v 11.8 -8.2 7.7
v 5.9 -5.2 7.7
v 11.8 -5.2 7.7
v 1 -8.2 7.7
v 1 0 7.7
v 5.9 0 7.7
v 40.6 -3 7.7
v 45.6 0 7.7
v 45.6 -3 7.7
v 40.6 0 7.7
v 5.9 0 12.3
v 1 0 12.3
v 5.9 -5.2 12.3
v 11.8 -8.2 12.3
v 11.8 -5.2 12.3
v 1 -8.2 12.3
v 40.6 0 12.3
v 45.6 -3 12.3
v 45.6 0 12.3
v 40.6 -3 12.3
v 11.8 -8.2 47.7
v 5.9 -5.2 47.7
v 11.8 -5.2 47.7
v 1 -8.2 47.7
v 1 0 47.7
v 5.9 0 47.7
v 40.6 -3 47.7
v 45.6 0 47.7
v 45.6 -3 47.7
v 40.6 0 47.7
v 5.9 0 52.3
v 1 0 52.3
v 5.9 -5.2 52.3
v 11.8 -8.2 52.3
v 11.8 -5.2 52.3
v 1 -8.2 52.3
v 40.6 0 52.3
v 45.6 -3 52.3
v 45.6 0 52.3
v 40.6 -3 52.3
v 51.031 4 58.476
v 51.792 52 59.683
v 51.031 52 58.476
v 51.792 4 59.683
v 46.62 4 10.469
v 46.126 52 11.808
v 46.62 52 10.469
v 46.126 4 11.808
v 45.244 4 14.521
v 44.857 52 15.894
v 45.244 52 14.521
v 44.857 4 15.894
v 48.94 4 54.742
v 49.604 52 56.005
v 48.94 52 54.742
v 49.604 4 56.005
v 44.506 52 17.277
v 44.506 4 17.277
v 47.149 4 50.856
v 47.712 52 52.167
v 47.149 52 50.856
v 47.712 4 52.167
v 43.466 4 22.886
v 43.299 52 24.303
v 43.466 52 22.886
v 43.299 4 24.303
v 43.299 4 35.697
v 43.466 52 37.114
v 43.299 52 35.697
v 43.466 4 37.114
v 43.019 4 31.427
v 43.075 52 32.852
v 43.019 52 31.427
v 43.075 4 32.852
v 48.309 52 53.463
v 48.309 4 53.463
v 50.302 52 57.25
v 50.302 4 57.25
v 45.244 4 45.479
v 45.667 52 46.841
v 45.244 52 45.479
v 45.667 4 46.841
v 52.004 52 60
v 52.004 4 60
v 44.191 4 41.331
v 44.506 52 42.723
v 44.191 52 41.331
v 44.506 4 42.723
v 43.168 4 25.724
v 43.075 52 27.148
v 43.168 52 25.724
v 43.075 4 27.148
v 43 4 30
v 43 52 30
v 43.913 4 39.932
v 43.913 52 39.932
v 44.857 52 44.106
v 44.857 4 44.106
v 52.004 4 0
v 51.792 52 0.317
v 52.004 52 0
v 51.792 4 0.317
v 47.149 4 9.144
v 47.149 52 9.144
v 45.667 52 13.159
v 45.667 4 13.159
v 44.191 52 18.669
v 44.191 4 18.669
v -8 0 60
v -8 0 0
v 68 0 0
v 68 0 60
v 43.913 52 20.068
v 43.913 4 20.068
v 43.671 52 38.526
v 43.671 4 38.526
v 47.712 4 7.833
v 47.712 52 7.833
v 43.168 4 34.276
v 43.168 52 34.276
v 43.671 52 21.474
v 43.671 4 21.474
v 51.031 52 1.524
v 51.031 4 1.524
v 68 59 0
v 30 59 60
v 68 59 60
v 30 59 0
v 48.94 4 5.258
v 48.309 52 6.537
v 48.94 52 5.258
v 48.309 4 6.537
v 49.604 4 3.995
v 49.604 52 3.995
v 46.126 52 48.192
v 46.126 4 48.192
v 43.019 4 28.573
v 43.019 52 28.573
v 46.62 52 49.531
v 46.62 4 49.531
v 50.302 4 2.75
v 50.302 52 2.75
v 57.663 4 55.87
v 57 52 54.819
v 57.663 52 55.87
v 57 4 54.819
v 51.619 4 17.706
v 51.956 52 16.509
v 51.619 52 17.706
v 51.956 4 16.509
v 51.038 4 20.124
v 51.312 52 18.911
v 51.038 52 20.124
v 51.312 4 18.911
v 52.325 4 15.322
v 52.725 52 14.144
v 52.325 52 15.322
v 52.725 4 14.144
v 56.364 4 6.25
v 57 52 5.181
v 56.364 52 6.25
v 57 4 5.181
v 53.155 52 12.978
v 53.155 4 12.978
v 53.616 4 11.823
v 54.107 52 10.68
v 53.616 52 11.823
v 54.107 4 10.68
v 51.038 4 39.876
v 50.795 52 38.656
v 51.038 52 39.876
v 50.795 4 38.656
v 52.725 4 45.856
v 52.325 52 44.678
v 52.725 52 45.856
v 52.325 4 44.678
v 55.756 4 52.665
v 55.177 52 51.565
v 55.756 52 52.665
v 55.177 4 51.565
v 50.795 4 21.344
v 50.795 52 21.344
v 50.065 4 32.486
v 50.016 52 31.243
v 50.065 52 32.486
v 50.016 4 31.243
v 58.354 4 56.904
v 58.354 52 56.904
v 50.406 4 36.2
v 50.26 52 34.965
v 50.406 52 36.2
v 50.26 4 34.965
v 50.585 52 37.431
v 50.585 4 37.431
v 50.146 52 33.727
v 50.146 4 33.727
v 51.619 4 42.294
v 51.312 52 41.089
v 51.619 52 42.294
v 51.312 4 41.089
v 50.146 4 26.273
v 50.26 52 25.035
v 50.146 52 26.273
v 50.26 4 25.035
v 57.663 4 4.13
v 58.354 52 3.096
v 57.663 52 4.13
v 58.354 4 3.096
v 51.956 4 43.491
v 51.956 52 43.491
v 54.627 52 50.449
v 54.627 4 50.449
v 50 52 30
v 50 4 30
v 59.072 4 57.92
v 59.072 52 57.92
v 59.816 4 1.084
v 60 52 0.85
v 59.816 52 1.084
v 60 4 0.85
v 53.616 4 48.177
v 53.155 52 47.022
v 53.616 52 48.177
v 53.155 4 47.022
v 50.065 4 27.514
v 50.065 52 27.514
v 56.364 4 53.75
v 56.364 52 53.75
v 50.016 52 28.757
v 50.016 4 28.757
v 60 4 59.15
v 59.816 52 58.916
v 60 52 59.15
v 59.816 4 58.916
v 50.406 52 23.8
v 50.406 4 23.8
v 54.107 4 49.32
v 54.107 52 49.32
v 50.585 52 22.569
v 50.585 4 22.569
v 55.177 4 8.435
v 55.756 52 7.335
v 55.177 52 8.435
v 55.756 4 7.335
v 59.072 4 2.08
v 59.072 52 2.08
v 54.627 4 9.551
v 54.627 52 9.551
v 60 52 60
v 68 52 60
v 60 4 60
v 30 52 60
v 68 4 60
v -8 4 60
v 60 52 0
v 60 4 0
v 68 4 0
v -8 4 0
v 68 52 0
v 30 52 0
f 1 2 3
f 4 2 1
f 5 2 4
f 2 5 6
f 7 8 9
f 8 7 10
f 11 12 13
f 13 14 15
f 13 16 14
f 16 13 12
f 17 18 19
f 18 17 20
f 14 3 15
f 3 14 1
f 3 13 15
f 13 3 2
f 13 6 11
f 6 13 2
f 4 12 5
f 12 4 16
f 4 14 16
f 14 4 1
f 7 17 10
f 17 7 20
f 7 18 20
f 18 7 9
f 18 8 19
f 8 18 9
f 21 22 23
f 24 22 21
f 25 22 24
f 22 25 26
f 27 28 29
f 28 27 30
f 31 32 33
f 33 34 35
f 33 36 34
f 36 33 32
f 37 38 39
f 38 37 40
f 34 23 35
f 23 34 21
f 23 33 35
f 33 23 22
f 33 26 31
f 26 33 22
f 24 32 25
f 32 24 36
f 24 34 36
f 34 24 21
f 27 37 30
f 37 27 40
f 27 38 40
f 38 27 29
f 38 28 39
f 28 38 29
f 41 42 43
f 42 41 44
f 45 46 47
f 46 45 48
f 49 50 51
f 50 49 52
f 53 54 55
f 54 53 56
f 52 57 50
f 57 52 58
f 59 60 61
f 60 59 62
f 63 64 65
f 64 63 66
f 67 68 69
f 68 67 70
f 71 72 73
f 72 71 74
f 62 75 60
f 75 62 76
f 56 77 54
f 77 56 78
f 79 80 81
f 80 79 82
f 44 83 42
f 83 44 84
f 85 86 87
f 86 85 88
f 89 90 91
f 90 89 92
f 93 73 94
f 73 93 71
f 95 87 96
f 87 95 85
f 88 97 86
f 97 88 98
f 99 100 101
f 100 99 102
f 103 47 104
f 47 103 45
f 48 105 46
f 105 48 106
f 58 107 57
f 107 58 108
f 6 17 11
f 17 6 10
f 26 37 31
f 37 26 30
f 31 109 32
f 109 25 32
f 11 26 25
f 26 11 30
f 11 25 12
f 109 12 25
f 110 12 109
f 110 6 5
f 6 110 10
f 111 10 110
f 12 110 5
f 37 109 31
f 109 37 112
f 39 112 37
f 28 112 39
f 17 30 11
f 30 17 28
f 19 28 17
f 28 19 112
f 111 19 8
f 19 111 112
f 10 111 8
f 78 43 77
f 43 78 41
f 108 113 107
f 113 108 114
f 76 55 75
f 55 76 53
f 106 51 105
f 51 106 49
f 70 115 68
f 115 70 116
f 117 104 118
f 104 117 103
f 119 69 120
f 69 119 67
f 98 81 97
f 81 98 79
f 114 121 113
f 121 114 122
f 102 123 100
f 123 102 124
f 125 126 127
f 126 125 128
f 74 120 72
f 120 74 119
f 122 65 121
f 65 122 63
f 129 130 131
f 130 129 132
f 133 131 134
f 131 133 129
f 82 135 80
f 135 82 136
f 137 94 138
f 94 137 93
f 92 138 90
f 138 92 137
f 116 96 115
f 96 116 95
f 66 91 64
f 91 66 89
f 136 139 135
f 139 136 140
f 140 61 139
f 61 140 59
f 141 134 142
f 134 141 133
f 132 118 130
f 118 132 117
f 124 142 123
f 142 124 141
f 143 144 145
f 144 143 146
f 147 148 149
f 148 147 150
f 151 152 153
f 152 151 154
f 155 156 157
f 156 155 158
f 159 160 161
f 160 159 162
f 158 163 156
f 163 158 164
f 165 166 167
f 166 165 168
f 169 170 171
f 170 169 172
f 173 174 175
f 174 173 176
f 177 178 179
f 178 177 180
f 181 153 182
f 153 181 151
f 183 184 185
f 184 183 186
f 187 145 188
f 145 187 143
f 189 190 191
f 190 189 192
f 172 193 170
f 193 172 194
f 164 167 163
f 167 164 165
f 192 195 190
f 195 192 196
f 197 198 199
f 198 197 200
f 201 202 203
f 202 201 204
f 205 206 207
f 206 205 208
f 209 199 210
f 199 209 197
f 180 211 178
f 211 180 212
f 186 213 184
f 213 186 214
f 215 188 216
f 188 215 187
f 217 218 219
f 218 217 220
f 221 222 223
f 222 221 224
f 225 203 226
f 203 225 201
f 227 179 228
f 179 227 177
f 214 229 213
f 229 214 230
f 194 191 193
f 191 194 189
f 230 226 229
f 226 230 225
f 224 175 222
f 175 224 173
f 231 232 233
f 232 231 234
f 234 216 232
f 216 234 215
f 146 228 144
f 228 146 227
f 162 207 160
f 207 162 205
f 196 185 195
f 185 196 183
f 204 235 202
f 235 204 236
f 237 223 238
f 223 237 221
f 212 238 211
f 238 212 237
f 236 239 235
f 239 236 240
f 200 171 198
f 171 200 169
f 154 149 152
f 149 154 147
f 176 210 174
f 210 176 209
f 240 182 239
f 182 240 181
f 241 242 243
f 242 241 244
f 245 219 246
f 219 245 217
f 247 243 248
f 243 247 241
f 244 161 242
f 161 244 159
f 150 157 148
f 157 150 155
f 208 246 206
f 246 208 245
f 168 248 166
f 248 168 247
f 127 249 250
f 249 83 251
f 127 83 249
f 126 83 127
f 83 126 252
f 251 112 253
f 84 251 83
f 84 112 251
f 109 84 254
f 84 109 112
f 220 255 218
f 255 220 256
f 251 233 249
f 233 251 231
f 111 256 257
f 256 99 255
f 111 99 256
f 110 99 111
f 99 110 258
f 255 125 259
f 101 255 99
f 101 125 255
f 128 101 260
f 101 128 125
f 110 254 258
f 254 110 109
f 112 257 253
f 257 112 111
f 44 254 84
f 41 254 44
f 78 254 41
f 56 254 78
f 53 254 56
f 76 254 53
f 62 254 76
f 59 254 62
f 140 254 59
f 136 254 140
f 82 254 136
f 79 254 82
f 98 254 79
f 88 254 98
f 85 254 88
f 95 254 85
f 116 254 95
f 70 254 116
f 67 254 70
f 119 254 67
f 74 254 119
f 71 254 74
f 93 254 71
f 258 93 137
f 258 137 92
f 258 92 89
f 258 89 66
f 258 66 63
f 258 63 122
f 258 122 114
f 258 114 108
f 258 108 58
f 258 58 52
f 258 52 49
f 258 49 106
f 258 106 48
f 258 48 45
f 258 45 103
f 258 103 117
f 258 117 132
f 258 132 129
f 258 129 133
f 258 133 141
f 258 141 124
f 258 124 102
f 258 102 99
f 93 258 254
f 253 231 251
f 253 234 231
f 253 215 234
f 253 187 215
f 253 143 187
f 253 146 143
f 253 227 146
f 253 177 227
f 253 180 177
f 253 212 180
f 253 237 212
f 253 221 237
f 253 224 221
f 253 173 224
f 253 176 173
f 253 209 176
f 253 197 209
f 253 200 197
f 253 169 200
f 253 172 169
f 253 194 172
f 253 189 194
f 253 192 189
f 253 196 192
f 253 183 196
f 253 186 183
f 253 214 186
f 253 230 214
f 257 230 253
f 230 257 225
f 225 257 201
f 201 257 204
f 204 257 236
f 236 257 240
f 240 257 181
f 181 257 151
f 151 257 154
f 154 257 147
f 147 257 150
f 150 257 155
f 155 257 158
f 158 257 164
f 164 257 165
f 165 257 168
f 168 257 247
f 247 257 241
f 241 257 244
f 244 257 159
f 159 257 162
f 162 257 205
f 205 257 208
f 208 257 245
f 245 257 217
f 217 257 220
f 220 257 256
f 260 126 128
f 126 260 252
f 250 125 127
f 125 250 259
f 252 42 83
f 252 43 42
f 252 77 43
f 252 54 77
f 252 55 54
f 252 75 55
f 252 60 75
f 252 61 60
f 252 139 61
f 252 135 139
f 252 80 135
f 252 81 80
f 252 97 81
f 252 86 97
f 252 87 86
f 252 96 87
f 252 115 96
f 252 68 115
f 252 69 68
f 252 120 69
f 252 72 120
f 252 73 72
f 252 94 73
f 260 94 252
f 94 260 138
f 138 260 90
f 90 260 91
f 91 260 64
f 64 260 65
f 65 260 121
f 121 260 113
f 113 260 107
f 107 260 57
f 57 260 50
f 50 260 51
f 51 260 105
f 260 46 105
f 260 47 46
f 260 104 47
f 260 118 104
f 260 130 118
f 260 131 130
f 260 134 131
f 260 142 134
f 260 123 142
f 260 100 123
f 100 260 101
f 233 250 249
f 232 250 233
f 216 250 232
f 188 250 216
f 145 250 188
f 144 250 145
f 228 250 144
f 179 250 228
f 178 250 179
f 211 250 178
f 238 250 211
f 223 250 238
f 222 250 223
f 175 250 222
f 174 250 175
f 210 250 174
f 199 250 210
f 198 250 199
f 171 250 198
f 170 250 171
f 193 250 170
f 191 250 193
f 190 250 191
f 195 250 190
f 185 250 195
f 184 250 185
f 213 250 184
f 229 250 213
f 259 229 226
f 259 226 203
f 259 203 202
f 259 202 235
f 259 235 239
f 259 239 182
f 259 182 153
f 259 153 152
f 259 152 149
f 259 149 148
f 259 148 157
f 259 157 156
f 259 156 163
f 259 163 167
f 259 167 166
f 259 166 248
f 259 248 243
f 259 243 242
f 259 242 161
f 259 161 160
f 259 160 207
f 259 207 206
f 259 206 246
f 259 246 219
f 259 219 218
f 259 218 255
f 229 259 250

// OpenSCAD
// file: skadis-lib.scad
// Shared pieces for the SKÅDIS accessories. Not printed on its own.
//
// Frame for an accessory: the board's FRONT face is the plane y = 0 (the board fills
// y -5..0), x runs across the board, z up, and z = 0 is the centre of the slot the upper
// hanger uses. Every accessory is built in this frame and saved with as_print(), which lays
// it on its side (x becomes the print's z), so the hangers print with their layers running
// along the lip and nothing needs support.
//
// The hanger is IKEA's own way of holding on, proven on skadis-hook.scad: a 4.6 mm wide tab
// goes through a slot and a lip behind the board drops 5.9 mm below the slot; a short peg
// sits in the slot 40 mm below so the piece cannot tip, swing or lift by accident. Lift it
// 6 mm to take it off. Two hangers 40 mm apart (two slots of one row) carry anything heavy.
//
// Profile (u out from the front face, v up from the upper slot's centre), dropped position:
//   tab  u -5.2..0,    v -5.9..-1    rests on the slot's rounded bottom (-5.98 for a 4.6 tab)
//   lip  u -8.2..-5.2, v -11.8..-1   5.8 mm of board behind it
//   peg  u -3..0,      v -45.6..-40.6
// Raised 5.9 for fitting, the tab and lip (10.8 tall) pass the slot, whose straight height
// for a 4.6 mm part is 11.96; the peg stays inside the lower slot (usable -45.98..-34.02).

hanger_w = 4.6;
hanger_drop = 5.9;
hanger_bottom = -45.6;        // the lowest point of a hanger (the peg's bottom)
key_len = 13; key_neck = 5; key_tip = 11; key_depth = 3.5;
key_poly = [[-key_len / 2, -key_tip / 2], [-key_len / 2, key_tip / 2], [0, key_neck / 2], [key_len / 2, key_tip / 2], [key_len / 2, -key_tip / 2], [0, -key_neck / 2]];

module hanger2d() {
    translate([-5.2, -5.9]) square([5.2 + 0.01, 4.9]);
    translate([-8.2, -11.8]) square([3, 10.8]);
    translate([-3, -45.6]) square([3 + 0.01, 5]);
}
// extrude a 2D (u, v) profile along x, from x0 to x0 + w
module along_x(x0, w) multmatrix([[0, 0, 1, x0], [1, 0, 0, 0], [0, 1, 0, 0], [0, 0, 0, 1]]) linear_extrude(w) children();
module hanger(x) along_x(x - hanger_w / 2, hanger_w) hanger2d();
module hangers(xs) for (x = xs) hanger(x);
// a slab from the front face: u 0..t, v v0..v1, x x0..x1 (the spine that sits on the board)
module spine(x0, x1, v0, v1, t = 4) translate([x0, 0, v0]) cube([x1 - x0, t, v1 - v0]);
// lay the finished accessory on its side for printing: x up, lying on its x = 0 face
module as_print() rotate([0, -90, 0]) children();
// rounded 2D rectangle, for arms and lips
module rr(w, h, r) offset(r = r, $fn = 24) offset(delta = -r) square([w, h]);
// main file
// Wide hooks for the SKÅDIS board, on the shared hanger (skadis-lib.scad).
//   kind = "headset"     60 wide, two hangers, 55 mm reach, the arm crowned 9 mm across its
//                        width so a headband sits centred and the pads hang free. x1
//   kind = "controller"  24 wide, one hanger, 60 mm reach, 25 mm tip: the pad goes between
//                        the grips and the controller hangs face out. x1
// Print on the side, as saved, PETG, 4 walls, 30 % infill, no supports.
//   openscad -D 'kind="headset"' -o skadis-headset-hook-x1.stl skadis-arm-hook.scad

include <skadis-lib.scad>

kind = "headset";
W     = kind == "headset" ? 60 : 24;
reach = kind == "headset" ? 55 : 60;
tip   = kind == "headset" ? 22 : 25;
crown = kind == "headset" ? 9 : 0;     // how much the arm's centre stands above its edges
arm = 7; spine_t = 4;
v_arm = -52;                            // the arm's top at the edges (below the lower peg)
hx = kind == "headset" ? [W / 2 - 20, W / 2 + 20] : [W / 2];

R = crown > 0 ? (pow(W / 2, 2) + crown * crown) / (2 * crown) : 0;   // crown circle through the edges
module crowned_arm() {   // the arm as a curved plate, constant 7 thick, running out along y
    if (crown > 0) intersection() {
        translate([W / 2, 0, v_arm + crown - R]) rotate([-90, 0, 0]) difference() { cylinder(r = R, h = spine_t + reach, $fn = 240); translate([0, 0, -1]) cylinder(r = R - arm, h = spine_t + reach + 2, $fn = 240); }
        translate([0, 0, v_arm - arm - 1]) cube([W, spine_t + reach, arm + crown + 2]);
    } else translate([0, 0, v_arm - arm]) cube([W, spine_t + reach, arm]);
}
module piece() {
    hangers(hx);
    spine(0, W, v_arm - arm - crown, 8, spine_t);
    crowned_arm();
    translate([0, spine_t + reach - arm, v_arm - arm - crown]) cube([W, arm, arm + crown + tip]);   // the tip, full width
}
as_print() piece();
